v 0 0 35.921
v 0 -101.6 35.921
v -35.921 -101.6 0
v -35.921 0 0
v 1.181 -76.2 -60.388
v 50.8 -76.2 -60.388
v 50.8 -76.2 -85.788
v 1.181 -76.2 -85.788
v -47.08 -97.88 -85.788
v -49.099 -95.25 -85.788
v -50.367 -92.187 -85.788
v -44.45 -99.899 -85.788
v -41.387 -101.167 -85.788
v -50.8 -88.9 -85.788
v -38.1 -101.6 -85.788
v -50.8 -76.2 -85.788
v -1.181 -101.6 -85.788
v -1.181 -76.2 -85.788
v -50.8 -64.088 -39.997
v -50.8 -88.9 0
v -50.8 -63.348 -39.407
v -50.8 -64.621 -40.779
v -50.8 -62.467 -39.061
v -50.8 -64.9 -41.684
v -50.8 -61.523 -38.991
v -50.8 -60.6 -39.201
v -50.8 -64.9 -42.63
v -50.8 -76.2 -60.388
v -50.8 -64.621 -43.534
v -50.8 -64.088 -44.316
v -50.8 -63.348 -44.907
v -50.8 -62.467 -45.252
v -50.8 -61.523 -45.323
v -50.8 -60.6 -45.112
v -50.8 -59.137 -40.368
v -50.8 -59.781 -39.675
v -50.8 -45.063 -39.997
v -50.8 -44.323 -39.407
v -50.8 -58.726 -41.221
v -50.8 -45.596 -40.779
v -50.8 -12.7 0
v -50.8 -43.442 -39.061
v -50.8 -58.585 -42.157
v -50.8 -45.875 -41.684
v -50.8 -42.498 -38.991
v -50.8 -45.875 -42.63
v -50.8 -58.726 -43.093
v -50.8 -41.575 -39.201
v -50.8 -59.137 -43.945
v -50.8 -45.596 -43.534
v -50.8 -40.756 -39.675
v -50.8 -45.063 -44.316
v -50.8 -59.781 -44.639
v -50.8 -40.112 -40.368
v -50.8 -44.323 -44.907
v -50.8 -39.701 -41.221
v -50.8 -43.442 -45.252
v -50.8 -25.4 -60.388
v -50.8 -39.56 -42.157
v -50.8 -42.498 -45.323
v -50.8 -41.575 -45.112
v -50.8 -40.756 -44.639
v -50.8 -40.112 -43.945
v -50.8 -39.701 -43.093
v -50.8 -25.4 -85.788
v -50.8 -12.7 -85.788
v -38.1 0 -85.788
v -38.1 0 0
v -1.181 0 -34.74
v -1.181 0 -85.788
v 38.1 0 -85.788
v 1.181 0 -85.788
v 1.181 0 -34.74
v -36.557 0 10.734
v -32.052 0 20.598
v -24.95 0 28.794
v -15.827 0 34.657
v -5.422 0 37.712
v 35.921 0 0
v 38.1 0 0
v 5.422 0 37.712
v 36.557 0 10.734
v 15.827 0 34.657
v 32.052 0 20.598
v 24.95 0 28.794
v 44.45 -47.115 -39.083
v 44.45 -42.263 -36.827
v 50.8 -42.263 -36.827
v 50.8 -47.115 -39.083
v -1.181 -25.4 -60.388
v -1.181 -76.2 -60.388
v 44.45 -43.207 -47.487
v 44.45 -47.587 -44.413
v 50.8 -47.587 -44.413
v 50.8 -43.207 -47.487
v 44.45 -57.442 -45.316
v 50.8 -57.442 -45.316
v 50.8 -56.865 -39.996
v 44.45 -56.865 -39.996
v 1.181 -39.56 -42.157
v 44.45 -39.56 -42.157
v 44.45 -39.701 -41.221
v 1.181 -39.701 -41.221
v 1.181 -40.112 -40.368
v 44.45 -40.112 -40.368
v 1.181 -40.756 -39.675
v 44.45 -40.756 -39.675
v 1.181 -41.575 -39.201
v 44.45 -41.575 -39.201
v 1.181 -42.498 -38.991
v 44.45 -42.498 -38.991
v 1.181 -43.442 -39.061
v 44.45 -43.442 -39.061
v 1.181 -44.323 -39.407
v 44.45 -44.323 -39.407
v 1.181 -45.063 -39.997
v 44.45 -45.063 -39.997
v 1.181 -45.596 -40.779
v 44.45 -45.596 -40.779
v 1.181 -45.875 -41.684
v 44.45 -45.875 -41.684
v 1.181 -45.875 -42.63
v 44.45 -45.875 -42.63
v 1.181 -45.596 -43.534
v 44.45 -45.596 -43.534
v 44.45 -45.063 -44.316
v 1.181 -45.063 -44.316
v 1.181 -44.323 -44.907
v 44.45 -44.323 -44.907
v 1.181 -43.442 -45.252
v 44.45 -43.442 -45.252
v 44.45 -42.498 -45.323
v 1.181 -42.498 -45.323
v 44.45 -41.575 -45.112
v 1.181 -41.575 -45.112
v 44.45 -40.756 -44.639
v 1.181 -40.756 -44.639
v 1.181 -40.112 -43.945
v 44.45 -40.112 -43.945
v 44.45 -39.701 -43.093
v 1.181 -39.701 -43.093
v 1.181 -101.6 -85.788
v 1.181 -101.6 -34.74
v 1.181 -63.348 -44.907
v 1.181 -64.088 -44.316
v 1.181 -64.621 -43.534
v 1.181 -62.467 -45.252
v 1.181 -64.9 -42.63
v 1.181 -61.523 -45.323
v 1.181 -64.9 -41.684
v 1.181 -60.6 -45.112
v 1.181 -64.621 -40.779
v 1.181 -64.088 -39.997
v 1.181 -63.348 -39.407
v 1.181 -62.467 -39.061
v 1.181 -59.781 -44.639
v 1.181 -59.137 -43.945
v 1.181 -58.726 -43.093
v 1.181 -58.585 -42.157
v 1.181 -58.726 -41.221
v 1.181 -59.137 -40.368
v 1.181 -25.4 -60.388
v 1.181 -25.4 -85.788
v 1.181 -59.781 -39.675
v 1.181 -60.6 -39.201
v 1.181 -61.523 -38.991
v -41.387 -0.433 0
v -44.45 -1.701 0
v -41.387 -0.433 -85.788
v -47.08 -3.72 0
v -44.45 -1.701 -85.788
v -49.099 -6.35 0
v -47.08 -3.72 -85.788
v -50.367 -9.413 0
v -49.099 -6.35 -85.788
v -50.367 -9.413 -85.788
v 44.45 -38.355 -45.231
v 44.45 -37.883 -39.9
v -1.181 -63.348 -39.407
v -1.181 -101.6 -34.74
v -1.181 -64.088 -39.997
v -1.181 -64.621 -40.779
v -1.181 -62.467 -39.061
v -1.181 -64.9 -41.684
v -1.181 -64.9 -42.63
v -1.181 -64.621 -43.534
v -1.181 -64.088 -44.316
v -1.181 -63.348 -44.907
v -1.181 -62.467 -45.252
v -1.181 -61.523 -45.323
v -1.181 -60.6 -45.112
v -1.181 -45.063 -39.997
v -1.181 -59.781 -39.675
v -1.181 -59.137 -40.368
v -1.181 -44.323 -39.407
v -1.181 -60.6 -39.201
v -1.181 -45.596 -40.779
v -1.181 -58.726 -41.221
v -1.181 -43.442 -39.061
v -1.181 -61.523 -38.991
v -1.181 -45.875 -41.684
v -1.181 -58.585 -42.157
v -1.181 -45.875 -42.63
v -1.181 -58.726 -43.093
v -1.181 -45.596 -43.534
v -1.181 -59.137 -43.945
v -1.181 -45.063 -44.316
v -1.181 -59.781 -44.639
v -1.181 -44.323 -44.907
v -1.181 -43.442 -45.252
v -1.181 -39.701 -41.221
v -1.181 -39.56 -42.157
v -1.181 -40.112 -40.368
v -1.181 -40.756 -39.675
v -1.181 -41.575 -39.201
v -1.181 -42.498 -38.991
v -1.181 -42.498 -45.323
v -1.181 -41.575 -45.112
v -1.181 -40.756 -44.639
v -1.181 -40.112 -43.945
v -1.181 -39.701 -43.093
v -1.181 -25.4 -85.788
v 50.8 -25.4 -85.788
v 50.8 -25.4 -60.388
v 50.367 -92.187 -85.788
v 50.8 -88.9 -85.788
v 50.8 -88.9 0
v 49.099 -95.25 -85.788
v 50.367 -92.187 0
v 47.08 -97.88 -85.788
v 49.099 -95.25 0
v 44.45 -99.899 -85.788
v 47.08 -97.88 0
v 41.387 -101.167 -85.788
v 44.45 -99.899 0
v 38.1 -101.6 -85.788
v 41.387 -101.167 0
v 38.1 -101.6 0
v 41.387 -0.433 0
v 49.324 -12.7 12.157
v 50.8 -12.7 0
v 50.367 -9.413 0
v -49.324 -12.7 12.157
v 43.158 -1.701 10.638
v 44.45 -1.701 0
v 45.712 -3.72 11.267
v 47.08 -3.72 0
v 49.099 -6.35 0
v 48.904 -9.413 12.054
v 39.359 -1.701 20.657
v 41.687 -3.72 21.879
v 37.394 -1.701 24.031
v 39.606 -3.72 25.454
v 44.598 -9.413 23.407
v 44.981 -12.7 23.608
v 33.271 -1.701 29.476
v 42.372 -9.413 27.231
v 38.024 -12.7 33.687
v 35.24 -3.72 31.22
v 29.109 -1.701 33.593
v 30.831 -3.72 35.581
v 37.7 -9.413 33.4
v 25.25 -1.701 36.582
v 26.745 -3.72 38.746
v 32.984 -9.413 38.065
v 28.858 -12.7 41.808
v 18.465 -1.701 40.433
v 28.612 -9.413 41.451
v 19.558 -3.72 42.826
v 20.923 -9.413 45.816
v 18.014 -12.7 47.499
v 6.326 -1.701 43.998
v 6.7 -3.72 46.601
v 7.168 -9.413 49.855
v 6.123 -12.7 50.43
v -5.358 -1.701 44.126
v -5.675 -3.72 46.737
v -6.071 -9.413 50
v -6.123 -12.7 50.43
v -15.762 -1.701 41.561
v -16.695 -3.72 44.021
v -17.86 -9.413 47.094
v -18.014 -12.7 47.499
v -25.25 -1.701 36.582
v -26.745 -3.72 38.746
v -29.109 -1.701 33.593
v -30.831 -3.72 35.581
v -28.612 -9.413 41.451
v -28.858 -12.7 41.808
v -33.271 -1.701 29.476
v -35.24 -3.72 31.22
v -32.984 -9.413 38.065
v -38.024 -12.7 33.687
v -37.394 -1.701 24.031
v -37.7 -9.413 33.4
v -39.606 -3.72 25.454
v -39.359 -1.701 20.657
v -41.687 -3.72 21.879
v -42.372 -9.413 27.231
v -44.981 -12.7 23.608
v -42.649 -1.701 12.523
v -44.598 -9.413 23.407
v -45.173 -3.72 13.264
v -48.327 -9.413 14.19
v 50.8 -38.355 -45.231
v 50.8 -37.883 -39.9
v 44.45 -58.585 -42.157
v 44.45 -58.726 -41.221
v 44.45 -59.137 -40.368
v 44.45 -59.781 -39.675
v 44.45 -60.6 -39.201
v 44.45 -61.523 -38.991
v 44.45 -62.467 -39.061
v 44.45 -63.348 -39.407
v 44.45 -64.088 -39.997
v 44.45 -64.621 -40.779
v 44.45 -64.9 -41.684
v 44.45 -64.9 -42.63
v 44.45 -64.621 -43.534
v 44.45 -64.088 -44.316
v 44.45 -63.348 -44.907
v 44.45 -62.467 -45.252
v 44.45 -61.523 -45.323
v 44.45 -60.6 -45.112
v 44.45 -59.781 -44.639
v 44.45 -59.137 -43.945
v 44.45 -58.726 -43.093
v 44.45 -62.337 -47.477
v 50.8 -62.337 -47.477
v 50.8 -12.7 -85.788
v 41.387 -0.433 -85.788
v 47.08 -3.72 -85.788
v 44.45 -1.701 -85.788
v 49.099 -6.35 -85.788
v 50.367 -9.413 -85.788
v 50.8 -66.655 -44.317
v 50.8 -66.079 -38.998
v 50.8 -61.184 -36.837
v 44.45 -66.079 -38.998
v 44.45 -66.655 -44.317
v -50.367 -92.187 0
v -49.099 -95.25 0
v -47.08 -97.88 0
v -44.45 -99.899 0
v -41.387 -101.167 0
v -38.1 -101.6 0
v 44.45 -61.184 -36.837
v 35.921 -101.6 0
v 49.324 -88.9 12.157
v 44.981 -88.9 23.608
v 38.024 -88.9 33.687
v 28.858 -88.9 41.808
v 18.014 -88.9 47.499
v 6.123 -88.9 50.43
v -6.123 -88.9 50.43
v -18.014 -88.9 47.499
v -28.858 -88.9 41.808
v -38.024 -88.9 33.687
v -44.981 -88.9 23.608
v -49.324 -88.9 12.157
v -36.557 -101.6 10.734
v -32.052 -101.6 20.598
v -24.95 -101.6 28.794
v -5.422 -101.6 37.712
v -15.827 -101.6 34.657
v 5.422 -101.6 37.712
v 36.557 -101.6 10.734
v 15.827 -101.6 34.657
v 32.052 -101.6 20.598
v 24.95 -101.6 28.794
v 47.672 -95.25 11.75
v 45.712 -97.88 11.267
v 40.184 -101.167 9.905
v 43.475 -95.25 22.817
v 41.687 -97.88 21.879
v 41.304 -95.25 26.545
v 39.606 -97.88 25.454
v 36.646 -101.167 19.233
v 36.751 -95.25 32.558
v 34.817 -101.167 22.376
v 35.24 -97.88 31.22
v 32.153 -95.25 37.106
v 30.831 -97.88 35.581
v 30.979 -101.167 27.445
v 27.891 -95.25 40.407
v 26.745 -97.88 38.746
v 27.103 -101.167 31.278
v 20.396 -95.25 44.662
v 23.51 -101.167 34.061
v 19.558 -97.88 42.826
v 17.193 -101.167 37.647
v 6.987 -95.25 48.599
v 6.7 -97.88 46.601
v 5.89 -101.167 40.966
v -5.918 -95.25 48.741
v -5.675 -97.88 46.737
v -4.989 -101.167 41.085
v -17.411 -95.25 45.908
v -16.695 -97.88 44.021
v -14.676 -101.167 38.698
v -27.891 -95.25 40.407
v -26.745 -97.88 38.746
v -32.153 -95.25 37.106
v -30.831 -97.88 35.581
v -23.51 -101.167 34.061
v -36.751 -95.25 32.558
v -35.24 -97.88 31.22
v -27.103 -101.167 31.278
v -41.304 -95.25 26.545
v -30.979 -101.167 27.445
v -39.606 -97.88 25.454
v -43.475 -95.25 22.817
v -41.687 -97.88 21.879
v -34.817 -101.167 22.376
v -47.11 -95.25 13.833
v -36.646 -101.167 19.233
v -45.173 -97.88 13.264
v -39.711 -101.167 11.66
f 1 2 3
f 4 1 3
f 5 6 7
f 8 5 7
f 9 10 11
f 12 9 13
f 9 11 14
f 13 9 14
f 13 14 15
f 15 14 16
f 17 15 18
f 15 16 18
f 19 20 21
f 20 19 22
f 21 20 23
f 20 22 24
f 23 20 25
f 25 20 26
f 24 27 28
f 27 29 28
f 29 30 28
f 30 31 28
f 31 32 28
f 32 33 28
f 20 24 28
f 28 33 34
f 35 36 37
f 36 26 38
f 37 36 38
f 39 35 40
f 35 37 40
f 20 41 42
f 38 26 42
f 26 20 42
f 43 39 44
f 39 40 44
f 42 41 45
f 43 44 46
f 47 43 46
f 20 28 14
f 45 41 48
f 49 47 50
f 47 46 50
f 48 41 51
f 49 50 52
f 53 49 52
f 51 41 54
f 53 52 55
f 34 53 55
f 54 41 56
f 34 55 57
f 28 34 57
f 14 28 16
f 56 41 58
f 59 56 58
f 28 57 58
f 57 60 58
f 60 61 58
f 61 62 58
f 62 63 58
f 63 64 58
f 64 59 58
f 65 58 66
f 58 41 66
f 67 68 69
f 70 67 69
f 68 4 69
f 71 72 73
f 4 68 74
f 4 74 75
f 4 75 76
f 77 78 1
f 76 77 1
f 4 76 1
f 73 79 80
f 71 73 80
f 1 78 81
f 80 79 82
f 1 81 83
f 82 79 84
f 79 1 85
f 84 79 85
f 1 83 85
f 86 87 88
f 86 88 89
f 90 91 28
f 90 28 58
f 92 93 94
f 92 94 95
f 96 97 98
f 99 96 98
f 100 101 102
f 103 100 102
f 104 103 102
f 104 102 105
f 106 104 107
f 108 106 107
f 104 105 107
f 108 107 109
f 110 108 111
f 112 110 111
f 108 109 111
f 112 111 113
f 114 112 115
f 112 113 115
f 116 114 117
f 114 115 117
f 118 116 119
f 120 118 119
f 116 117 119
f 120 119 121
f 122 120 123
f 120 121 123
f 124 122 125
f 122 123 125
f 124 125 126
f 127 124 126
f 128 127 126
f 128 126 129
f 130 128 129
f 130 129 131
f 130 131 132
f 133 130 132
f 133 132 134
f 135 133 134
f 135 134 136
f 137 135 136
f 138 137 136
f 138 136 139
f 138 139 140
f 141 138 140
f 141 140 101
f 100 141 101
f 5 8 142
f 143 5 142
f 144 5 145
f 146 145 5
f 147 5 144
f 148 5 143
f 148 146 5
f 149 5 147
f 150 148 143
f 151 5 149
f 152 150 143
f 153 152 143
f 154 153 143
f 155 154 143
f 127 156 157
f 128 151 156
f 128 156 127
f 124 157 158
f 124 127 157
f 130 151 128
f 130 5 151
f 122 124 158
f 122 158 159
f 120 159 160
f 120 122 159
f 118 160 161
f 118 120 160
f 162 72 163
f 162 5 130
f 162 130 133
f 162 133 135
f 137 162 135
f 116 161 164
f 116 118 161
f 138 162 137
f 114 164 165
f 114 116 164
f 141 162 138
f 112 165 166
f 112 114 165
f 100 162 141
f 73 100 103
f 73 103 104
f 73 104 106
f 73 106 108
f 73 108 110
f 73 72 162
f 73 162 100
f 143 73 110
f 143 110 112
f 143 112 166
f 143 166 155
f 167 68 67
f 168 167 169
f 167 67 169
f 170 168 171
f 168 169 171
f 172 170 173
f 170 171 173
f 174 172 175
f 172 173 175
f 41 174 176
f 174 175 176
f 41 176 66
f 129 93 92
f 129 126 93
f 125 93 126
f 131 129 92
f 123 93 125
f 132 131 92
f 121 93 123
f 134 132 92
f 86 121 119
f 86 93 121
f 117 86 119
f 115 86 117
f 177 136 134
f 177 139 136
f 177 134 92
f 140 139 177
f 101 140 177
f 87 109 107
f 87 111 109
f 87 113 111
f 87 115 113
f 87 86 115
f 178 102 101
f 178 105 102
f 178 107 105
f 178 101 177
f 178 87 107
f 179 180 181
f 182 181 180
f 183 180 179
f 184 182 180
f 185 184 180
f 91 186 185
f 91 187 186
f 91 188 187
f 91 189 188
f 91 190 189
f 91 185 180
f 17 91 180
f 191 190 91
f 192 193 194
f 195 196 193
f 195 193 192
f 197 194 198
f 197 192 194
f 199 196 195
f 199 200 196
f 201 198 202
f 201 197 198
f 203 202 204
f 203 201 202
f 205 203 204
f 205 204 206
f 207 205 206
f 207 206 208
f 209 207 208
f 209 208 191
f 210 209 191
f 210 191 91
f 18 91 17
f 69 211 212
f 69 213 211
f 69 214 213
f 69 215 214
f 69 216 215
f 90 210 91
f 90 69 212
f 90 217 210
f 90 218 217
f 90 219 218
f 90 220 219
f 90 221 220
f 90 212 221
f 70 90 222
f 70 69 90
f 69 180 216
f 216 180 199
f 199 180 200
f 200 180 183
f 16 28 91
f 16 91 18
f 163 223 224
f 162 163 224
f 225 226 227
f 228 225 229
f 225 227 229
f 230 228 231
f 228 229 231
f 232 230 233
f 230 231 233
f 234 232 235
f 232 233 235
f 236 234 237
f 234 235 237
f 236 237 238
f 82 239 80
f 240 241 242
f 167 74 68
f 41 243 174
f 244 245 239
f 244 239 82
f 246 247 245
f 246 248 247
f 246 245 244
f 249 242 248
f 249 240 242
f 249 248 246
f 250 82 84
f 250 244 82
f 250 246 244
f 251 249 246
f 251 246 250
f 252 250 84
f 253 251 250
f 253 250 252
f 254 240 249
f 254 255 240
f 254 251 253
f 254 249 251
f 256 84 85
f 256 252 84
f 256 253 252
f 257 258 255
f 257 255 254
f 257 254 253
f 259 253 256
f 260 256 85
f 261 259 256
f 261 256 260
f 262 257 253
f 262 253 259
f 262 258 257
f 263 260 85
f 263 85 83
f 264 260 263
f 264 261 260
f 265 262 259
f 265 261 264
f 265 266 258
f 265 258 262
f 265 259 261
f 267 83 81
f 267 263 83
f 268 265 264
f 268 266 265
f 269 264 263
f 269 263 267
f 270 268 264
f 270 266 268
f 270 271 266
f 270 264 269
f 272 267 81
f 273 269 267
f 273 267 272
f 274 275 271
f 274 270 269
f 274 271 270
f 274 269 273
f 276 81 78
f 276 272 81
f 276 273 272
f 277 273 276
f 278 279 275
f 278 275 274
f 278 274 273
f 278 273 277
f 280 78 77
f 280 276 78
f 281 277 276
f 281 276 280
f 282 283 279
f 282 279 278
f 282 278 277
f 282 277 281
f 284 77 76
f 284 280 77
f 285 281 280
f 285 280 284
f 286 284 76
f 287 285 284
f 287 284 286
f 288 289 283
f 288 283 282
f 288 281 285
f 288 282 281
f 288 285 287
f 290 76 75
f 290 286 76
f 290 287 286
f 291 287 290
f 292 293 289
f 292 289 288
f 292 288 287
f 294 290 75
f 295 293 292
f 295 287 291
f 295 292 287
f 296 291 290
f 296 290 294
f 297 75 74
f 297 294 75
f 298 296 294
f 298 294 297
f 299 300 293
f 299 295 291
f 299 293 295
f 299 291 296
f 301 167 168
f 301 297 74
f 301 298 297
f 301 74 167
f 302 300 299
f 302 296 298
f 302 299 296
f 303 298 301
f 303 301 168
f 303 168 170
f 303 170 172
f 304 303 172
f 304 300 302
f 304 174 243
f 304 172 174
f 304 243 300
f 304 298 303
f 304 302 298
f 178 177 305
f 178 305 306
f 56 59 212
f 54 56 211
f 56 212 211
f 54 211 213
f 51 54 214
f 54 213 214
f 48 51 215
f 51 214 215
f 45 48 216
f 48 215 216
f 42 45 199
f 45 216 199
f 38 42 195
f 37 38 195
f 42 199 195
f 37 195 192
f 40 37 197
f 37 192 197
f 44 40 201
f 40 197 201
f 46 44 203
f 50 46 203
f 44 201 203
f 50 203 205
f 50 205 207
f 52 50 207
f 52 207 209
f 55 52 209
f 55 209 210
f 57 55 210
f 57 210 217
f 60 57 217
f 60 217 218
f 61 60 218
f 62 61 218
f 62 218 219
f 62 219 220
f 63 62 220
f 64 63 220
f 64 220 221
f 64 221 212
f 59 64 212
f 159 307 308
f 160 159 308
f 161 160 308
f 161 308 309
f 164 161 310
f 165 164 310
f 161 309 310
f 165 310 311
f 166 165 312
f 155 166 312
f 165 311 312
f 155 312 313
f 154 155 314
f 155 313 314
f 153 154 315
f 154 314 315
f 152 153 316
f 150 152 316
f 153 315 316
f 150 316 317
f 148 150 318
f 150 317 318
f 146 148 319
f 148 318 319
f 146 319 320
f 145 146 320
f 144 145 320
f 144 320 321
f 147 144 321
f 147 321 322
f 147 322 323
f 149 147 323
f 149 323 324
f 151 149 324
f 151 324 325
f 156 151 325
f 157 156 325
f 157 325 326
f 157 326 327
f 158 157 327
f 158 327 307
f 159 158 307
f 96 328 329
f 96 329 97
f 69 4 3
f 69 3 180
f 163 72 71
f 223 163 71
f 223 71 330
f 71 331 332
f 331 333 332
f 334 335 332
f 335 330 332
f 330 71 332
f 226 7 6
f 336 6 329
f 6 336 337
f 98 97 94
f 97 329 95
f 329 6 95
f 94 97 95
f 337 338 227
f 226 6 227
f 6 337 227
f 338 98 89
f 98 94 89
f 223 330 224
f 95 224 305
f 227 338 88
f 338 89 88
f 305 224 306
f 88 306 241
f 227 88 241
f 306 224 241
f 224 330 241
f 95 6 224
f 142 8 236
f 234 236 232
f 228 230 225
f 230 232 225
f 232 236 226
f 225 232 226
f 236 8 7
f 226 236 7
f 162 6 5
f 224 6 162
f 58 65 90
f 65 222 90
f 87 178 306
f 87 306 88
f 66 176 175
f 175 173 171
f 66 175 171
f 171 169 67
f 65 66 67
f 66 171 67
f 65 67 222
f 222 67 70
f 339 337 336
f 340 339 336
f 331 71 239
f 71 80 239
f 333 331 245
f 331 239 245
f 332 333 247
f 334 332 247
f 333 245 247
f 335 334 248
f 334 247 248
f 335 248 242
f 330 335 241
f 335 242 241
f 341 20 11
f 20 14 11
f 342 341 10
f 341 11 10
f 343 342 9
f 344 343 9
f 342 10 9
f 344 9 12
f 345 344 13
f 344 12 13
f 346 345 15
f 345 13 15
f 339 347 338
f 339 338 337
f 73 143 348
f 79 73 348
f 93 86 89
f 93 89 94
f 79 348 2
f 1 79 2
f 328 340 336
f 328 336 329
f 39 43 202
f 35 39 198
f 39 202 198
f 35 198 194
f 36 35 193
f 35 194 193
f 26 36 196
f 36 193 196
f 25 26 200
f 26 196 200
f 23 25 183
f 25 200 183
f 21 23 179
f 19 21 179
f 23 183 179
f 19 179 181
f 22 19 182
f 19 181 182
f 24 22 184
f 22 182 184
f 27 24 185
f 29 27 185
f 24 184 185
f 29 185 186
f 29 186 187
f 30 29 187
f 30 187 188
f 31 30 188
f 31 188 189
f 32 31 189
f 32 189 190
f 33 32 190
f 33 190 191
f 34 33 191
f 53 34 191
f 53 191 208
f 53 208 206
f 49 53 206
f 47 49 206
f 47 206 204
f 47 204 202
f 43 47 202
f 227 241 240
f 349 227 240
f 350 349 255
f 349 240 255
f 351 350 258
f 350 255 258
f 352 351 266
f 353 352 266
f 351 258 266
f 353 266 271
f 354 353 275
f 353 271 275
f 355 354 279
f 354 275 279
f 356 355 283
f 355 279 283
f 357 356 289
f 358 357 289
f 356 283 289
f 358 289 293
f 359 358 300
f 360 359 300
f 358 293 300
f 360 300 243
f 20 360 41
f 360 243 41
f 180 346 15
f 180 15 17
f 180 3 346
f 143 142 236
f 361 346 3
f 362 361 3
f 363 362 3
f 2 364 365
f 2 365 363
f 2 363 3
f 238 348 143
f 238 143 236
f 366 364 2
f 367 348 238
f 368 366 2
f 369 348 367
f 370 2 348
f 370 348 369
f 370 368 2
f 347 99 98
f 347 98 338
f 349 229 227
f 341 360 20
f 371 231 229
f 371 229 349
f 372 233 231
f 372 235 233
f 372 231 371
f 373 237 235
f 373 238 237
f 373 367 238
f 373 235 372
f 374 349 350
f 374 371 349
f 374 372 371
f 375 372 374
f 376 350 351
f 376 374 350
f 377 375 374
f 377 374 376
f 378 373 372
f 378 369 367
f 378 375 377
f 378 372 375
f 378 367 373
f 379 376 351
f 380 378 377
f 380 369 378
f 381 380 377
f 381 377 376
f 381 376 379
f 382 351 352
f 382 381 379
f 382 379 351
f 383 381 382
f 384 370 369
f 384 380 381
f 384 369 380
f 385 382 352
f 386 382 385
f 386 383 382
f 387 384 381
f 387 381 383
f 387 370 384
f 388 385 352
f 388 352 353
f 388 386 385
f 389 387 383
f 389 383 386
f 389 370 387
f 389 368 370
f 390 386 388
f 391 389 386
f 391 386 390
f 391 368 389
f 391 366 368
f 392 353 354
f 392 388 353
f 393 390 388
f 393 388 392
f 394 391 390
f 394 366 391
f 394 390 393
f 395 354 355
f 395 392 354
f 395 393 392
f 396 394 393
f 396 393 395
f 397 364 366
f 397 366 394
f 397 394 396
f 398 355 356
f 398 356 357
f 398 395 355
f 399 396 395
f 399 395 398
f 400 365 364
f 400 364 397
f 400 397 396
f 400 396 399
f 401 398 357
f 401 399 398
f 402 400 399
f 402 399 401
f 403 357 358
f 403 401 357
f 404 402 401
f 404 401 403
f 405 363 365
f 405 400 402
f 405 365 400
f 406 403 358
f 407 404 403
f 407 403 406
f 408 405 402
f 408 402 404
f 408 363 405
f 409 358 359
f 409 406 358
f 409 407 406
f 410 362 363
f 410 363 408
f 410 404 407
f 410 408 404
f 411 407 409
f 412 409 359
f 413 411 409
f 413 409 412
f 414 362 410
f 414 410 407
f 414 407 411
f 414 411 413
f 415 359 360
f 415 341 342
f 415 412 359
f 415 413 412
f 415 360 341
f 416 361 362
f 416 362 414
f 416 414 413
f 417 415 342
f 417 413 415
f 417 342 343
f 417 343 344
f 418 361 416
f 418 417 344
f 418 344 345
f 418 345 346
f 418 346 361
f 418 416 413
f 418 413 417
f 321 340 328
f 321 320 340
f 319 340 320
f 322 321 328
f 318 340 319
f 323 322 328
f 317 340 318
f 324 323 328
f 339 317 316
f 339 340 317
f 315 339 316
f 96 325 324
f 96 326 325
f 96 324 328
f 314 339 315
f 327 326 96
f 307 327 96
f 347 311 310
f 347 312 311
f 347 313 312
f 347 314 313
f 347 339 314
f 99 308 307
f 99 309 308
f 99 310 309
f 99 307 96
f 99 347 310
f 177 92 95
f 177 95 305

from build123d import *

# Parameters (mm, degrees)
F3_DEPTH = 101.6
F4_DEPTH = 282.663077116
F5_R     = 3.175
F6_DEPTH = 127
F7_DEPTH = 6.35
F8_W     = 50.8
F8_H     = 50.8
F8_H_2   = 25.4
F9_DEPTH = 127
F10_R    = 12.7


with BuildPart() as f3:
    # F0 (on Front) → F3 (new body)
    with BuildSketch(Plane.XZ):
        with BuildLine():
            Line((50.8, -85.7884685198), (50.8, 0))
            ThreePointArc((50.8, 0), (0, -50.8), (-50.8, 0))
            Line((-50.8, 0), (-50.8, -85.7884685198))
            Line((-50.8, -85.7884685198), (50.8, -85.7884685198))
        make_face()
        with BuildLine():
            ThreePointArc((-50.8, 0), (0, -50.8), (50.8, 0))
            ThreePointArc((50.8, 0), (0, 50.8), (-50.8, 0))
        make_face()
    extrude(amount=F3_DEPTH)

    # F2 (on face) + F1 (on Front) → F4 (cut)
    with BuildSketch(Plane.XZ):
        with BuildLine():
            Line((-1.1809319258, -85.7884685198), (1.1809319258, -85.7884685198))
            Line((1.1809319258, -85.7884685198), (1.1809319258, -50.786271765))
            ThreePointArc((1.1809319258, -50.786271765), (0, -50.8), (-1.1809319258, -50.786271765))
            Line((-1.1809319258, -50.786271765), (-1.1809319258, -85.7884685198))
        make_face()
        with BuildLine():
            ThreePointArc((-1.1809319258, -50.786271765), (0, -50.8), (1.1809319258, -50.786271765))
            Line((1.1809319258, -50.786271765), (1.1809319258, 14.9626284838))
            Line((1.1809319258, 14.9626284838), (-1.1809319258, 14.9626284838))
            Line((-1.1809319258, 14.9626284838), (-1.1809319258, -50.786271765))
        make_face()
    with BuildSketch(Plane.XZ):
        Polygon((35.9210244843, 0), (0, 35.9210244843), (-35.9210244843, 0), (0, -35.9210244843), align=None)
    extrude(amount=F4_DEPTH, mode=Mode.SUBTRACT)

    # F5 (on face) → F6 (cut)
    with BuildSketch(Plane.YZ.offset(50.8)):
        with Locations((-42.7350864422, -42.1568825841)):
            Circle(F5_R)
        with Locations((-61.7602499746, -42.1568825841)):
            Circle(F5_R)
    extrude(amount=-F6_DEPTH, mode=Mode.SUBTRACT)

    # F5 (on face) → F7 (cut)
    with BuildSketch(Plane.YZ.offset(50.8)):
        Polygon((-62.336745475, -47.4765820931), (-57.4415028095, -45.3159920871), (-56.8650073091, -39.9962925781), (-61.1837544742, -36.8371830751), (-66.0789971397, -38.9977730811), (-66.6554926401, -44.3174725901), align=None)
        with Locations((-61.7602499746, -42.1568825841)):
            Circle(F5_R, mode=Mode.SUBTRACT)
        Polygon((-43.2069172048, -47.486893887), (-38.3550766327, -45.2305056623), (-37.88324587, -39.9004943594), (-42.2632556795, -36.8268712812), (-47.1150962516, -39.0832595059), (-47.5869270143, -44.4132708088), align=None)
        with Locations((-42.7350864422, -42.1568825841)):
            Circle(F5_R, mode=Mode.SUBTRACT)
    extrude(amount=-F7_DEPTH, mode=Mode.SUBTRACT)

    # F8 (on face) → F9 (cut)
    with BuildSketch(Plane.YZ.offset(50.8)):
        with Locations((-50.8, -85.7884685198)):
            Rectangle(F8_W, F8_H)
        with Locations((-50.8, -73.0884685198)):
            Rectangle(F8_W, F8_H_2)
    extrude(amount=-F9_DEPTH, mode=Mode.SUBTRACT)

    # F10
    f10_edges = [f3.edges().sort_by_distance(p)[0] for p in [
        (0, -101.6, 50.8),
        (50.8, -101.6, -42.894234),
        (0, 0, 50.8),
        (50.8, 0, -42.894234),
        (-50.8, 0, -42.894234),
        (-50.8, -101.6, -42.894234),
    ]]
    fillet(f10_edges, radius=F10_R)


solid = f3.part
